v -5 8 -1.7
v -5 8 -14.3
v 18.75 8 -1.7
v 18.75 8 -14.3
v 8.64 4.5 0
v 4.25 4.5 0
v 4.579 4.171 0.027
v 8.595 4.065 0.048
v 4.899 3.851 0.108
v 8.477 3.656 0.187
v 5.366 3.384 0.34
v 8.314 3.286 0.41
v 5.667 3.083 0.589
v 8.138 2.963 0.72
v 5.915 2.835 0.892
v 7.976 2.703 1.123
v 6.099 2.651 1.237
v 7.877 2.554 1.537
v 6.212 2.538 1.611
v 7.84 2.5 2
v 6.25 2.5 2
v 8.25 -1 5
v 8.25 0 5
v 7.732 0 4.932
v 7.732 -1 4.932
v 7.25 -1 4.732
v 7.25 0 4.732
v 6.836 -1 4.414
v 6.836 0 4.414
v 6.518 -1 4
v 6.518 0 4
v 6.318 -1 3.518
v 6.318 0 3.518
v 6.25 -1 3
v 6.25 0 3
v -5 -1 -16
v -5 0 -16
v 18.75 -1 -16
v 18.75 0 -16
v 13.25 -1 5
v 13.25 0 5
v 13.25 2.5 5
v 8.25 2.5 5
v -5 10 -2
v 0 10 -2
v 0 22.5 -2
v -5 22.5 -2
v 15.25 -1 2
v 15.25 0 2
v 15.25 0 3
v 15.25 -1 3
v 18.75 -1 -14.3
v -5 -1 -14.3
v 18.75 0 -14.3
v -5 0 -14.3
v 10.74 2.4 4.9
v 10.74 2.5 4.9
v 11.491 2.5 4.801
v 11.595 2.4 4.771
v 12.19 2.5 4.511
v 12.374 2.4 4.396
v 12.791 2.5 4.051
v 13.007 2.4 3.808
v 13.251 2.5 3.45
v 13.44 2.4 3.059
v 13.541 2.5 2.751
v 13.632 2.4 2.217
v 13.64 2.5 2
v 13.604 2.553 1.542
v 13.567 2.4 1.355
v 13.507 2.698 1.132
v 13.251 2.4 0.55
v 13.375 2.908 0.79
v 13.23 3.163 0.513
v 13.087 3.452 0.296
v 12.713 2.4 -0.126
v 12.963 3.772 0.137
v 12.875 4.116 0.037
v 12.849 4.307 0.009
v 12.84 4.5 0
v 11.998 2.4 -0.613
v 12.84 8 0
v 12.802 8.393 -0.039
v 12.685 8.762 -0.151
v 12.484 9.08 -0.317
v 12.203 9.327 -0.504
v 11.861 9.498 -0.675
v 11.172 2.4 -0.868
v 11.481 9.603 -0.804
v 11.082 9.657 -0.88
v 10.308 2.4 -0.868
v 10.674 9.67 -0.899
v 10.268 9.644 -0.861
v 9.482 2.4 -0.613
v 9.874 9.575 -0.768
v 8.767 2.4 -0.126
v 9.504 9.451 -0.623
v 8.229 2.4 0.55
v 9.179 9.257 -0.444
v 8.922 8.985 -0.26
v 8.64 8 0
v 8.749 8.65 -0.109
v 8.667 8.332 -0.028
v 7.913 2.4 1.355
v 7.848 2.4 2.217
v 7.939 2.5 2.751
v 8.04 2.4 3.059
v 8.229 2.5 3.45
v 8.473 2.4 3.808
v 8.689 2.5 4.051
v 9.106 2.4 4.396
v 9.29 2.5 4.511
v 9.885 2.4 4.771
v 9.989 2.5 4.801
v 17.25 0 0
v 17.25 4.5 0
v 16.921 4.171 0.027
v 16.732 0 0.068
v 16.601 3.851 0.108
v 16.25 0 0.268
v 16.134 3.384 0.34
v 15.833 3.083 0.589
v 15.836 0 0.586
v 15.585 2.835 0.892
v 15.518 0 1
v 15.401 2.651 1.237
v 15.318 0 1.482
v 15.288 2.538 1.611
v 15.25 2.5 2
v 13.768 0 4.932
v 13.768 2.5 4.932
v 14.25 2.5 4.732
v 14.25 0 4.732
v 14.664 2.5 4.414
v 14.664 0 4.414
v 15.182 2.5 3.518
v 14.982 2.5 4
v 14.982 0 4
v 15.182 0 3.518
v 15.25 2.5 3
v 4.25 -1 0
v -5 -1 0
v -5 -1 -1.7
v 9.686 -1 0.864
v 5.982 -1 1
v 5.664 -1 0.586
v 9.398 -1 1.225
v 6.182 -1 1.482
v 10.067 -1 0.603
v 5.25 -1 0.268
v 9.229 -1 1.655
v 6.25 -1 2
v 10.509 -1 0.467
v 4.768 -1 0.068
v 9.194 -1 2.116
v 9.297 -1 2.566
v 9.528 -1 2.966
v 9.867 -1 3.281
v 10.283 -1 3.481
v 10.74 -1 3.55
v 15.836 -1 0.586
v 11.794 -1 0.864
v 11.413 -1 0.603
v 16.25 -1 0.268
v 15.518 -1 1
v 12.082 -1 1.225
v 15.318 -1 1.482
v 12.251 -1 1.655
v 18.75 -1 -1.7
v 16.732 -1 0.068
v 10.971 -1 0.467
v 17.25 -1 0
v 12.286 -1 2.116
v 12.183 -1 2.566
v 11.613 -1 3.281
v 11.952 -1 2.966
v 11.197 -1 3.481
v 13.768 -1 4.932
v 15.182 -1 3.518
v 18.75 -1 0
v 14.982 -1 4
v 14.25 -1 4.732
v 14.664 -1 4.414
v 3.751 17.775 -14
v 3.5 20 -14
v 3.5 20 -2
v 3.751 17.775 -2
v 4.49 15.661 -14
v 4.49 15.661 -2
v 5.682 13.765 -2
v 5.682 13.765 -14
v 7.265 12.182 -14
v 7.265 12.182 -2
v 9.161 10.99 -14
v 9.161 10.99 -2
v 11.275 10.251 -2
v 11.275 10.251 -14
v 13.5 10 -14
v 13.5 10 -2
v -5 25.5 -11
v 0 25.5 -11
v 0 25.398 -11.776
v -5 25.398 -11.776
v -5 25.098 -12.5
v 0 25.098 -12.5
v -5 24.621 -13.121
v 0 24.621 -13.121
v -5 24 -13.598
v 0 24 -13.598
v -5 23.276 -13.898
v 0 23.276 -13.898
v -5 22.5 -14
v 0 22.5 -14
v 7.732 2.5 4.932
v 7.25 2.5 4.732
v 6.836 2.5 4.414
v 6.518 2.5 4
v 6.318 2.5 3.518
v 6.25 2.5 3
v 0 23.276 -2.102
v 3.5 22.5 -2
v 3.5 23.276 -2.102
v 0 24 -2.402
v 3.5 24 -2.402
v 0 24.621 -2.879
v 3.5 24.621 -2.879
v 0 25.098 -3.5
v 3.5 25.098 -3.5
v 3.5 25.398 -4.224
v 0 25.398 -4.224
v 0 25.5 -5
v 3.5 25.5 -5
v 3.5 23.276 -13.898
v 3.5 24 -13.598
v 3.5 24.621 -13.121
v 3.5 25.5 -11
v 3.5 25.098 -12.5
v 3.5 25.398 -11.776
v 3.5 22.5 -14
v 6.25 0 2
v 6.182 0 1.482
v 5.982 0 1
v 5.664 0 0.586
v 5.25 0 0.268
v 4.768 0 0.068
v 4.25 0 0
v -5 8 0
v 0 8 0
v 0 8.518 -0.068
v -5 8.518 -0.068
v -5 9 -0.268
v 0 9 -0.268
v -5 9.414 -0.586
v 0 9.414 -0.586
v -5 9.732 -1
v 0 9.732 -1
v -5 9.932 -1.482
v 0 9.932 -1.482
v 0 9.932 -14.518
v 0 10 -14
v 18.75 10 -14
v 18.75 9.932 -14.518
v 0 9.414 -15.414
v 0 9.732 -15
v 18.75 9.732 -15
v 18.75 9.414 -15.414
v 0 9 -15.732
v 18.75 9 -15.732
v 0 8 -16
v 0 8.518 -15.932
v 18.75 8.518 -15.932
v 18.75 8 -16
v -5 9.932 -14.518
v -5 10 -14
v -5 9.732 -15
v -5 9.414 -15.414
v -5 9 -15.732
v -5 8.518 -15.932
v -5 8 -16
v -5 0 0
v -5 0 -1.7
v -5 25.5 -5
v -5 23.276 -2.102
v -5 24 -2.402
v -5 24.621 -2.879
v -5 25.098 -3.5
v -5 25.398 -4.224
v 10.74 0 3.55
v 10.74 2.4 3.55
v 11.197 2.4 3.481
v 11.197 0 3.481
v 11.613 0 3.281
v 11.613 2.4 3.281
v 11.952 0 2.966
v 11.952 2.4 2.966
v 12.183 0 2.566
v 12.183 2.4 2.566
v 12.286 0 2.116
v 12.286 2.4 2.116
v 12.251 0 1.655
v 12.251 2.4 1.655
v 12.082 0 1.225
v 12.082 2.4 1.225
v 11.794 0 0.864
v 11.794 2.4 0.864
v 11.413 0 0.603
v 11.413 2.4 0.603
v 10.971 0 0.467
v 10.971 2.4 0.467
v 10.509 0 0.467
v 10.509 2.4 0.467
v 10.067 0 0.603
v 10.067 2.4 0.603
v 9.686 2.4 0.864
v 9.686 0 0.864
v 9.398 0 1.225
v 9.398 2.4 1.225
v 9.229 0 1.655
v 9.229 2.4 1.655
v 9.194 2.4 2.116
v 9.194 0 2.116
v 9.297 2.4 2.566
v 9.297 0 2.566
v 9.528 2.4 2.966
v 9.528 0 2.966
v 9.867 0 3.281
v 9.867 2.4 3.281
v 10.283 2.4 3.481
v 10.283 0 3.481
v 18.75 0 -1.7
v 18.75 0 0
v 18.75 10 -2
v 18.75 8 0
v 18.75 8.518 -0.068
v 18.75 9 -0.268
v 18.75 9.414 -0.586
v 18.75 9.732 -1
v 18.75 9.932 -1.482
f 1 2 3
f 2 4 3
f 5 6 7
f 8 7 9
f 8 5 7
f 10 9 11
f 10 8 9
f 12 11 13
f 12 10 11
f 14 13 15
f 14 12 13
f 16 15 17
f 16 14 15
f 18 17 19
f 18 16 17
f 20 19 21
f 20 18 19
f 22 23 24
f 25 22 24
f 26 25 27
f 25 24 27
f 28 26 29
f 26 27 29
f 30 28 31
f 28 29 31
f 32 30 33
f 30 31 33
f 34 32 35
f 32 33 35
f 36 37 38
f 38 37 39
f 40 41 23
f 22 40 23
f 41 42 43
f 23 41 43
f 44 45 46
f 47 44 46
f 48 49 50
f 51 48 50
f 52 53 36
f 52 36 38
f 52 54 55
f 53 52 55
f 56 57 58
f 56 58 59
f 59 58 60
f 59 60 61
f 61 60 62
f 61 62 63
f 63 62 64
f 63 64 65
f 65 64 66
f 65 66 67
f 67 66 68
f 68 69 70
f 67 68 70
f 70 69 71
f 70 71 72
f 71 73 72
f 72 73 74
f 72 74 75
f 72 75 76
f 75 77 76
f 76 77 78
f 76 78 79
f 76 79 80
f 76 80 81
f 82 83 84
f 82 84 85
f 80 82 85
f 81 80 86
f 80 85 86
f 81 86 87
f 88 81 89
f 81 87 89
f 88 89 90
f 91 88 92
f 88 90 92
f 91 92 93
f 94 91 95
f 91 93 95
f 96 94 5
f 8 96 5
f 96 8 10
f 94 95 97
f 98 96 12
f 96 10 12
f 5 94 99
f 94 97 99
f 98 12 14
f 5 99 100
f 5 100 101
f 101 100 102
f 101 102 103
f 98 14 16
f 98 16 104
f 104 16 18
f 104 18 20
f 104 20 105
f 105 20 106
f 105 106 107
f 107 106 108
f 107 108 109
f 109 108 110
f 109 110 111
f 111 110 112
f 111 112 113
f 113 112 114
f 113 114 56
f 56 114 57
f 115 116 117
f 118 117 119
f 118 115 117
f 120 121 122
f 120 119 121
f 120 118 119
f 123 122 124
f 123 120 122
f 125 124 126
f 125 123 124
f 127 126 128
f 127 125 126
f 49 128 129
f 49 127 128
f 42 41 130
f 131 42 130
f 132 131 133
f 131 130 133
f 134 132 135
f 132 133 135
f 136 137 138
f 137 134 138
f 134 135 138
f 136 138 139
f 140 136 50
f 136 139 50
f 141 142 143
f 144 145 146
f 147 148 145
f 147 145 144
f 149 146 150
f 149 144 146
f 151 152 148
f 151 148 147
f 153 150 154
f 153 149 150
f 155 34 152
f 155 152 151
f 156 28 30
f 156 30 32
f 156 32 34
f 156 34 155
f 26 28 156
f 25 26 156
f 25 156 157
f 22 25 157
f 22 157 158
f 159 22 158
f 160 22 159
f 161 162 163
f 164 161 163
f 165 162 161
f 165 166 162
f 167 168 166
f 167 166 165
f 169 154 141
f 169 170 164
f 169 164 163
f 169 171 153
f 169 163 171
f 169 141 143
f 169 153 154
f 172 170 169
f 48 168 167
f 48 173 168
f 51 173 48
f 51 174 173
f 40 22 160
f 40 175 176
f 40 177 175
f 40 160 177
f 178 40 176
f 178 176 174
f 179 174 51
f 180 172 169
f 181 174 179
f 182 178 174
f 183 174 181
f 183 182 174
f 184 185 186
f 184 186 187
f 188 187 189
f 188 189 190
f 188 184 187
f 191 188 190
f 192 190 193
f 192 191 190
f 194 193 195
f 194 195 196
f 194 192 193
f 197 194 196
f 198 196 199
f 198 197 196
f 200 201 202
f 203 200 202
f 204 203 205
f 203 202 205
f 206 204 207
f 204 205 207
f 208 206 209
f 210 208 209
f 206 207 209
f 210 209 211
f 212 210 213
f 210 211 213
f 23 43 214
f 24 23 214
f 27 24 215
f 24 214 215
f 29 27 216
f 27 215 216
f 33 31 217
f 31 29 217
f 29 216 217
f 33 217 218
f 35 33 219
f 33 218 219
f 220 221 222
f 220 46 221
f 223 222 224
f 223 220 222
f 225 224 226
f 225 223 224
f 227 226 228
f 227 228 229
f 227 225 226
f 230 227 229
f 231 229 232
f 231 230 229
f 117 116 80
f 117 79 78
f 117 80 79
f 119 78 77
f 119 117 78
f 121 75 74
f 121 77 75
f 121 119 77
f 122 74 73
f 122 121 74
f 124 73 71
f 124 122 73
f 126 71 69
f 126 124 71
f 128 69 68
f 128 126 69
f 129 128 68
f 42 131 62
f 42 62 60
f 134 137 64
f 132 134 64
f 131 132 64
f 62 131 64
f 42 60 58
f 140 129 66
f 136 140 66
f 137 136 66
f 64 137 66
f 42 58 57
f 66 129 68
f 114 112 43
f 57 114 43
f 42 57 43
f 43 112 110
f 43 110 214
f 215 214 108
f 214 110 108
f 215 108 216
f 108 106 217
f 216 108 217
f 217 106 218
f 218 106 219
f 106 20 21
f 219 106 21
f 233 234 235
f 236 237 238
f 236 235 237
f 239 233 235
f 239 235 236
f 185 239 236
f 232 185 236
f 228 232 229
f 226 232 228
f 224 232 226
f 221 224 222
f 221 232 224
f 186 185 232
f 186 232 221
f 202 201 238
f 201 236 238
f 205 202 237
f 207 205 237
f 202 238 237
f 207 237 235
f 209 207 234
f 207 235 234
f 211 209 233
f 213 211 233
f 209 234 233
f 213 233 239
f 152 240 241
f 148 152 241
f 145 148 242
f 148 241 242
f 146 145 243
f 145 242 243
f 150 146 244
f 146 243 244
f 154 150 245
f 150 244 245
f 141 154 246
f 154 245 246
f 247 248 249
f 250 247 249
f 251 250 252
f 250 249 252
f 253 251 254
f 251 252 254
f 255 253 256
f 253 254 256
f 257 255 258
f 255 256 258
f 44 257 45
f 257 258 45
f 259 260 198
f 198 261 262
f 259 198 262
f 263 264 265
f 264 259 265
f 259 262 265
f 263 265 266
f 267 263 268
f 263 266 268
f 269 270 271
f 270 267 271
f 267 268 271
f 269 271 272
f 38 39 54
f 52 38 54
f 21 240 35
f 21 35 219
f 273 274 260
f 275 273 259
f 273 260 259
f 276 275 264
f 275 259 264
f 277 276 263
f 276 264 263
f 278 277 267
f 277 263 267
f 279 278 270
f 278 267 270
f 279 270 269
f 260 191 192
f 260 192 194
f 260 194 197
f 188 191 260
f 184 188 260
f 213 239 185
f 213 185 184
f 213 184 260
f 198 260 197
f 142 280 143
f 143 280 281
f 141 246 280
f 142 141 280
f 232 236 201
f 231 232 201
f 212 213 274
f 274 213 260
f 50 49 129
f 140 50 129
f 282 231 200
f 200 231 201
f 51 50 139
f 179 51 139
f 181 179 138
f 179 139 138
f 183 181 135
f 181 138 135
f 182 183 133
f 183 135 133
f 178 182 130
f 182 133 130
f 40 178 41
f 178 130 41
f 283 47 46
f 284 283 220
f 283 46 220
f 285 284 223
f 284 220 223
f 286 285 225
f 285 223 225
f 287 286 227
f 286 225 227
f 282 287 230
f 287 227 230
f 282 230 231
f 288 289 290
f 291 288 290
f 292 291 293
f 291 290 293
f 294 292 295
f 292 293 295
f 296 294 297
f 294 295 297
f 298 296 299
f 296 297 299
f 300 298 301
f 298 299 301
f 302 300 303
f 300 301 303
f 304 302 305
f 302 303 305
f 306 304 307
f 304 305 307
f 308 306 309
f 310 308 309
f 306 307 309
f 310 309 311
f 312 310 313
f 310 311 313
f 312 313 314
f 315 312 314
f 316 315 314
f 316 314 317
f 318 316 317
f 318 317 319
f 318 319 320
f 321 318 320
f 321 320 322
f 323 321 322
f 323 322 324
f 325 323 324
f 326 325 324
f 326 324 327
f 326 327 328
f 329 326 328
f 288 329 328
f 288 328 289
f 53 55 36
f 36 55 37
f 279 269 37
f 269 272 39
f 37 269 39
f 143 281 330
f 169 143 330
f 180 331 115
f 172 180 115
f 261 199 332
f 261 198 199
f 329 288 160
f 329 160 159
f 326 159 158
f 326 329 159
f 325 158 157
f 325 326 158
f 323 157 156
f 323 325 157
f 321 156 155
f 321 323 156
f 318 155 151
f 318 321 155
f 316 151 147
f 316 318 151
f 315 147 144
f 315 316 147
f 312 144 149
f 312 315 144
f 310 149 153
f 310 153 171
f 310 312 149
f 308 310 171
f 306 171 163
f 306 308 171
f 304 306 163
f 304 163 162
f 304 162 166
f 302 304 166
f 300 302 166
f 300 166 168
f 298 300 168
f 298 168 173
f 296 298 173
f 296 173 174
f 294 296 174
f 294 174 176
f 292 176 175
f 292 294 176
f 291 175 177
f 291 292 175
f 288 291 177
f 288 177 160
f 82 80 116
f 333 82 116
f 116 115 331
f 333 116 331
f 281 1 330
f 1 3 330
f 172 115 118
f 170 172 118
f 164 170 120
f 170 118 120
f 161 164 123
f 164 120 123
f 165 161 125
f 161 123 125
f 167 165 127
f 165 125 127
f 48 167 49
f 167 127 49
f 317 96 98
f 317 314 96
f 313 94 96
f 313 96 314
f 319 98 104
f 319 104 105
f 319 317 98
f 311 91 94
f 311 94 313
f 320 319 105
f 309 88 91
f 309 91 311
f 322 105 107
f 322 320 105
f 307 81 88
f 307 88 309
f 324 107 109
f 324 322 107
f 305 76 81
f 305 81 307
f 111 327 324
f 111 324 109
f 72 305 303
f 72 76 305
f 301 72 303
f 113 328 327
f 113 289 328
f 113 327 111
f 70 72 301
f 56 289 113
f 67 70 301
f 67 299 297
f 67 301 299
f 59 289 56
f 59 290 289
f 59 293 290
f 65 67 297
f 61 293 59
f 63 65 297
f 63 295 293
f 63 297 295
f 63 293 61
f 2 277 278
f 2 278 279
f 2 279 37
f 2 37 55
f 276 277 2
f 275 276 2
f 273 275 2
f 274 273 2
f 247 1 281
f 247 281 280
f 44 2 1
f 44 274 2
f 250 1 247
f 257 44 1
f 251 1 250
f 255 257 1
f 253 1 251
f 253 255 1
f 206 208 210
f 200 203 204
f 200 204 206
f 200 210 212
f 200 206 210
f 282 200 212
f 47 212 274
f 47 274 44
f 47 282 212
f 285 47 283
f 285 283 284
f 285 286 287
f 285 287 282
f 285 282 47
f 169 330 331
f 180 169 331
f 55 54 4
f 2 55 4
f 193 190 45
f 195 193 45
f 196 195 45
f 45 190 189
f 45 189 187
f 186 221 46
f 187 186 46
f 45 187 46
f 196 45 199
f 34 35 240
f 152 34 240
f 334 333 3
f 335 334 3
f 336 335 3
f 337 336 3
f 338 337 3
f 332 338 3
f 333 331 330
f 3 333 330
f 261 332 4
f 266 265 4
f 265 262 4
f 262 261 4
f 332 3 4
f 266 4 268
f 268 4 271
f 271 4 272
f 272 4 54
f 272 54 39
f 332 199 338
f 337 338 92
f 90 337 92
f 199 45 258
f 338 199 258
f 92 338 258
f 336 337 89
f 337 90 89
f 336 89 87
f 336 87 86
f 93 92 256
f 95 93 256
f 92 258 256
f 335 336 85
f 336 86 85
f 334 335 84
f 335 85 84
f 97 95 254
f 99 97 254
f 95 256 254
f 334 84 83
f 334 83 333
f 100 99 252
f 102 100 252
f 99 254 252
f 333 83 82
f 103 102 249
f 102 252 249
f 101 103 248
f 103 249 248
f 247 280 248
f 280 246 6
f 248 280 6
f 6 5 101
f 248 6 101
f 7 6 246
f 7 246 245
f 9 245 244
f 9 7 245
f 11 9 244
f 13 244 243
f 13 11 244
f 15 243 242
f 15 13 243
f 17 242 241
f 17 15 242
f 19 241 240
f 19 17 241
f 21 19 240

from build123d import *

# Parameters (mm, degrees)
SALIENTE_EXTRUIR1_DEPTH = 10
CORTAR_EXTRUIR1_DEPTH   = 8
CROQUIS3_W              = 9
CROQUIS3_H              = 2.5
SALIENTE_EXTRUIR2_DEPTH = 5
CROQUIS4_R              = 1.5499999999999994
CORTAR_EXTRUIR2_DEPTH   = 2.5
REDONDEO1_R             = 2
CROQUIS5_R              = 2.9
CORTAR_EXTRUIR3_DEPTH   = 7.6
SALIENTE_EXTRUIR3_DEPTH = 15.5
REDONDEO2_R             = 10
REDONDEO3_R             = 3
SALIENTE_EXTRUIR4_DEPTH = 5
CROQUIS8_R              = 1.5499999999999994
SALIENTE_EXTRUIR5_DEPTH = 1


with BuildPart() as part:
    # Croquis1 → Saliente-Extruir1 (new body)
    with BuildSketch(Plane(origin=(0, 0, 0), x_dir=(1, 0, 0), z_dir=(0, 1, 0))):
        Polygon((0, 0), (18.75, 0), (18.749999999999996, 16), (-3.47e-15, 16), align=None)
    extrude(amount=SALIENTE_EXTRUIR1_DEPTH)

    # Croquis2 → Cortar-Extruir1 (cut)
    with BuildSketch(Plane.XZ):
        Polygon((0, -1.7000000000000002), (18.749999999999993, -1.6999999999999997), (18.749999999999996, -14.3), (1.51e-15, -14.3), align=None)
    extrude(amount=-CORTAR_EXTRUIR1_DEPTH, mode=Mode.SUBTRACT)

    # Croquis3 → Saliente-Extruir2 (add)
    with BuildSketch(Plane.XY):
        with Locations((10.750000000000002, 1.25)):
            Rectangle(CROQUIS3_W, CROQUIS3_H)
    extrude(amount=SALIENTE_EXTRUIR2_DEPTH)

    # Croquis4 → Cortar-Extruir2 (cut)
    with BuildSketch(Plane(origin=(0, 2.5, 0), x_dir=(1, 0, 0), z_dir=(0, 1, 0))):
        with Locations(Location((10.74, -2, 0), (0, 0, 270))):
            Circle(CROQUIS4_R)
    extrude(amount=-CORTAR_EXTRUIR2_DEPTH, mode=Mode.SUBTRACT)

    # Redondeo1
    # the kernel refuses this fillet: 2 mm, written as the material it adds along each edge
    with BuildSketch(Plane(origin=(6.25, 2.5, 0), x_dir=(-1, 0, 0), z_dir=(0, -1, 0))) as redondeo1_piece_1:
        with BuildLine():
            CenterArc((REDONDEO1_R, -REDONDEO1_R), REDONDEO1_R, 90, 90)
            Line((0, -REDONDEO1_R), (0, 0))
            Line((0, 0), (REDONDEO1_R, 0))
        make_face()
    extrude(amount=2.5)
    with BuildSketch(Plane(origin=(15.25, 0, 0), x_dir=(1, 0, 0), z_dir=(0, 1, 0))) as redondeo1_piece_2:
        with BuildLine():
            CenterArc((REDONDEO1_R, -REDONDEO1_R), REDONDEO1_R, 90, 90)
            Line((0, -REDONDEO1_R), (0, 0))
            Line((0, 0), (REDONDEO1_R, 0))
        make_face()
    extrude(amount=2.5)
    with BuildSketch(Plane(origin=(15.25, 2.5, 0), x_dir=(0, 1, 0), z_dir=(-1, 0, 0))) as redondeo1_piece_3_section:
        with BuildLine():
            CenterArc((REDONDEO1_R, -REDONDEO1_R), REDONDEO1_R, 90, 90)
            Line((0, -REDONDEO1_R), (0, 0))
            Line((0, 0), (REDONDEO1_R, 0))
        make_face()
    redondeo1_piece_3 = extrude(amount=9, mode=Mode.PRIVATE)
    redondeo1_piece_3 = redondeo1_piece_3 - Plane(origin=(10.74, 2.981912580650479, 2), x_dir=(-1.8e-16, 0, 1), z_dir=(0, 1, 0)) * Cylinder(1.5499999999999994, 26, mode=Mode.PRIVATE)
    add(redondeo1_piece_3)
    with BuildSketch(Plane(origin=(6.25, 7.5, 0), x_dir=(-1, 0, 0), z_dir=(0, -1, 0))) as redondeo1_piece_4a_section:
        with BuildLine():
            CenterArc((REDONDEO1_R, -REDONDEO1_R), REDONDEO1_R, 90, 90)
            Line((0, -REDONDEO1_R), (0, 0))
            Line((0, 0), (REDONDEO1_R, 0))
        make_face()
    redondeo1_piece_4a = extrude(amount=7.5, mode=Mode.PRIVATE)
    redondeo1_piece_4a = split(redondeo1_piece_4a, bisect_by=Plane(origin=(5.797209771466349, 2.5, 0.45279022853365075), z_dir=(0, 1, 0)), keep=Keep.TOP, mode=Mode.PRIVATE)
    with BuildSketch(Plane(origin=(15.25, 2.5, 0), x_dir=(0, 1, 0), z_dir=(-1, 0, 0))) as redondeo1_piece_4b_section:
        with BuildLine():
            CenterArc((REDONDEO1_R, -REDONDEO1_R), REDONDEO1_R, 90, 90)
            Line((0, -REDONDEO1_R), (0, 0))
            Line((0, 0), (REDONDEO1_R, 0))
        make_face()
    redondeo1_piece_4b = extrude(amount=14, mode=Mode.PRIVATE)
    redondeo1_piece_4b = split(redondeo1_piece_4b, bisect_by=Plane(origin=(6.25, 2.952790228533651, 0.45279022853365075), z_dir=(-1, 0, 0)), keep=Keep.TOP, mode=Mode.PRIVATE)
    redondeo1_piece_4 = redondeo1_piece_4a & redondeo1_piece_4b
    add(redondeo1_piece_4)
    with BuildSketch(Plane(origin=(20.25, 2.5, 0), x_dir=(0, 1, 0), z_dir=(-1, 0, 0))) as redondeo1_piece_5a_section:
        with BuildLine():
            CenterArc((REDONDEO1_R, -REDONDEO1_R), REDONDEO1_R, 90, 90)
            Line((0, -REDONDEO1_R), (0, 0))
            Line((0, 0), (REDONDEO1_R, 0))
        make_face()
    redondeo1_piece_5a = extrude(amount=14, mode=Mode.PRIVATE)
    redondeo1_piece_5a = split(redondeo1_piece_5a, bisect_by=Plane(origin=(18.75, 2.952790228533651, 0.45279022853365036), z_dir=(-1, 0, 2.2e-16)), keep=Keep.TOP, mode=Mode.PRIVATE)
    redondeo1_piece_5a = split(redondeo1_piece_5a, bisect_by=Plane(origin=(15.25, 2.952790228533651, 0.45279022853365075), z_dir=(1, 0, 0)), keep=Keep.TOP, mode=Mode.PRIVATE)
    with BuildSketch(Plane(origin=(15.25, 0, 0), x_dir=(1, 0, 0), z_dir=(0, 1, 0))) as redondeo1_piece_5b_section:
        with BuildLine():
            CenterArc((REDONDEO1_R, -REDONDEO1_R), REDONDEO1_R, 90, 90)
            Line((0, -REDONDEO1_R), (0, 0))
            Line((0, 0), (REDONDEO1_R, 0))
        make_face()
    redondeo1_piece_5b = extrude(amount=7.5, mode=Mode.PRIVATE)
    redondeo1_piece_5b = split(redondeo1_piece_5b, bisect_by=Plane(origin=(15.70279022853365, 2.5, 0.45279022853364964), z_dir=(0, 1, 0)), keep=Keep.TOP, mode=Mode.PRIVATE)
    redondeo1_piece_5 = redondeo1_piece_5a & redondeo1_piece_5b
    add(redondeo1_piece_5)
    # the kernel refuses this fillet: 2 mm, written as the material it takes off along each edge
    with BuildSketch(Plane(origin=(23.749999999999996, 10, -16), x_dir=(0, -1, 0), z_dir=(-1, 0, 0))) as redondeo1_2_piece_1:
        with BuildLine():
            CenterArc((REDONDEO1_R, REDONDEO1_R), REDONDEO1_R, 180, 90)
            Line((0, REDONDEO1_R), (0, 0))
            Line((0, 0), (REDONDEO1_R, 0))
        make_face()
    extrude(amount=28.75, mode=Mode.SUBTRACT)
    with BuildSketch(Plane(origin=(6.25, 7.5, 5), x_dir=(0, 0, -1), z_dir=(0, -1, 0))) as redondeo1_2_piece_2:
        with BuildLine():
            CenterArc((REDONDEO1_R, REDONDEO1_R), REDONDEO1_R, 180, 90)
            Line((0, REDONDEO1_R), (0, 0))
            Line((0, 0), (REDONDEO1_R, 0))
        make_face()
    extrude(amount=12.5, mode=Mode.SUBTRACT)
    with BuildSketch(Plane(origin=(15.25, -5, 5), x_dir=(0, 0, -1), z_dir=(0, 1, 0))) as redondeo1_2_piece_3:
        with BuildLine():
            CenterArc((REDONDEO1_R, REDONDEO1_R), REDONDEO1_R, 180, 90)
            Line((0, REDONDEO1_R), (0, 0))
            Line((0, 0), (REDONDEO1_R, 0))
        make_face()
    extrude(amount=12.5, mode=Mode.SUBTRACT)
    with BuildSketch(Plane(origin=(-5, 10, 0), x_dir=(0, -1, 0), z_dir=(1, 0, 0))) as redondeo1_2_piece_4:
        with BuildLine():
            CenterArc((REDONDEO1_R, REDONDEO1_R), REDONDEO1_R, 180, 90)
            Line((0, REDONDEO1_R), (0, 0))
            Line((0, 0), (REDONDEO1_R, 0))
        make_face()
    extrude(amount=28.75, mode=Mode.SUBTRACT)

    # Croquis5 → Cortar-Extruir3 (cut)
    with BuildSketch(Plane(origin=(0, 10, 0), x_dir=(1, 0, 0), z_dir=(0, 1, 0))):
        with Locations(Location((10.74, -2, 0), (0, 0, 270))):
            Circle(CROQUIS5_R)
    extrude(amount=-CORTAR_EXTRUIR3_DEPTH, mode=Mode.SUBTRACT)

    # Croquis6 → Saliente-Extruir3 (add)
    with BuildSketch(Plane(origin=(0, 10, 0), x_dir=(1, 0, 0), z_dir=(0, 1, 0))):
        Polygon((-3.04e-15, 14), (3.499999999999997, 14), (3.4999999999999982, 2), (-3.04e-15, 2), align=None)
    extrude(amount=SALIENTE_EXTRUIR3_DEPTH)

    # Redondeo2
    # the kernel refuses this fillet: 10 mm, written as the material it adds along each edge
    with BuildSketch(Plane(origin=(3.499999999999997, 10, -14), x_dir=(1, 0, -1.1e-16), z_dir=(1.1e-16, 0, 1))) as redondeo2_piece_1:
        with BuildLine():
            CenterArc((REDONDEO2_R, REDONDEO2_R), REDONDEO2_R, 180, 90)
            Line((-2.22e-15, REDONDEO2_R), (0, 0))
            Line((0, 0), (REDONDEO2_R, 0))
        make_face()
    extrude(amount=12)

    # Redondeo3
    redondeo3_edges = [part.edges().sort_by_distance(p)[0] for p in [
        (1.7499999999999976, 25.5, -2),
        (1.749999999999997, 25.5, -14),
    ]]
    fillet(redondeo3_edges, radius=REDONDEO3_R)

    # Croquis7 → Saliente-Extruir4 (add)
    with BuildSketch(Plane.ZY):
        with BuildLine():
            Line((-14.3, 0), (-14.3, 8))
            Line((-14.3, 8), (-1.7000000000000002, 8))
            Line((-1.7000000000000002, 8), (-1.7000000000000002, 0))
            Line((-1.7000000000000002, 0), (0, 0))
            Line((0, 0), (0, 8))
            ThreePointArc((0, 8), (-0.5857864376269049, 9.414213562373096), (-2, 10))
            Line((-2, 10), (-2, 22.500000000000004))
            ThreePointArc((-2, 22.500000000000004), (-2.878679656440357, 24.621320343559645), (-4.999999999999999, 25.500000000000004))
            Line((-4.999999999999999, 25.500000000000004), (-11, 25.500000000000004))
            ThreePointArc((-11, 25.500000000000004), (-13.121320343559642, 24.621320343559645), (-13.999999999999998, 22.500000000000004))
            Line((-13.999999999999998, 22.500000000000004), (-14, 10))
            ThreePointArc((-14, 10), (-15.414213562373096, 9.414213562373096), (-16, 8))
            Line((-16, 8), (-16, 0))
            Line((-16, 0), (-14.3, 0))
        make_face()
    extrude(amount=SALIENTE_EXTRUIR4_DEPTH)

    # Croquis8 → Saliente-Extruir5 (add)
    # profile 1 of 2: a face of its own
    with BuildSketch(Plane.XZ):
        with BuildLine():
            Line((13.25, 5), (8.25, 5))
            ThreePointArc((8.25, 5), (6.835786437626905, 4.414213562373095), (6.25, 3.0000000000000004))
            Line((6.25, 3.0000000000000004), (6.25, 2))
            ThreePointArc((6.25, 2), (5.664213562373095, 0.5857864376269051), (4.25, 0))
            Line((4.25, 0), (-5, 1.08e-15))
            Line((-5, 1.08e-15), (-5, -1.699999999999999))
            Line((-5, -1.699999999999999), (18.749999999999993, -1.6999999999999997))
            Line((18.749999999999993, -1.6999999999999997), (18.75, 0))
            Line((18.75, 0), (17.25, 0))
            ThreePointArc((17.25, 0), (15.835786437626904, 0.5857864376269051), (15.25, 2.0000000000000004))
            Line((15.25, 2.0000000000000004), (15.25, 3))
            ThreePointArc((15.25, 3), (14.664213562373096, 4.414213562373095), (13.25, 5))
        make_face()
        with Locations(Location((10.74, 2, 0), (0, 0, 90))):
            Circle(CROQUIS8_R, mode=Mode.SUBTRACT)
    # profile 2 of 2: a face of its own
    with BuildSketch(Plane.XZ):
        Polygon((18.749999999999996, -14.3), (-5.0000000000000036, -14.299999999999999), (-5.0000000000000036, -16), (18.749999999999996, -16), align=None)
    extrude(amount=SALIENTE_EXTRUIR5_DEPTH)


solid = part.part
